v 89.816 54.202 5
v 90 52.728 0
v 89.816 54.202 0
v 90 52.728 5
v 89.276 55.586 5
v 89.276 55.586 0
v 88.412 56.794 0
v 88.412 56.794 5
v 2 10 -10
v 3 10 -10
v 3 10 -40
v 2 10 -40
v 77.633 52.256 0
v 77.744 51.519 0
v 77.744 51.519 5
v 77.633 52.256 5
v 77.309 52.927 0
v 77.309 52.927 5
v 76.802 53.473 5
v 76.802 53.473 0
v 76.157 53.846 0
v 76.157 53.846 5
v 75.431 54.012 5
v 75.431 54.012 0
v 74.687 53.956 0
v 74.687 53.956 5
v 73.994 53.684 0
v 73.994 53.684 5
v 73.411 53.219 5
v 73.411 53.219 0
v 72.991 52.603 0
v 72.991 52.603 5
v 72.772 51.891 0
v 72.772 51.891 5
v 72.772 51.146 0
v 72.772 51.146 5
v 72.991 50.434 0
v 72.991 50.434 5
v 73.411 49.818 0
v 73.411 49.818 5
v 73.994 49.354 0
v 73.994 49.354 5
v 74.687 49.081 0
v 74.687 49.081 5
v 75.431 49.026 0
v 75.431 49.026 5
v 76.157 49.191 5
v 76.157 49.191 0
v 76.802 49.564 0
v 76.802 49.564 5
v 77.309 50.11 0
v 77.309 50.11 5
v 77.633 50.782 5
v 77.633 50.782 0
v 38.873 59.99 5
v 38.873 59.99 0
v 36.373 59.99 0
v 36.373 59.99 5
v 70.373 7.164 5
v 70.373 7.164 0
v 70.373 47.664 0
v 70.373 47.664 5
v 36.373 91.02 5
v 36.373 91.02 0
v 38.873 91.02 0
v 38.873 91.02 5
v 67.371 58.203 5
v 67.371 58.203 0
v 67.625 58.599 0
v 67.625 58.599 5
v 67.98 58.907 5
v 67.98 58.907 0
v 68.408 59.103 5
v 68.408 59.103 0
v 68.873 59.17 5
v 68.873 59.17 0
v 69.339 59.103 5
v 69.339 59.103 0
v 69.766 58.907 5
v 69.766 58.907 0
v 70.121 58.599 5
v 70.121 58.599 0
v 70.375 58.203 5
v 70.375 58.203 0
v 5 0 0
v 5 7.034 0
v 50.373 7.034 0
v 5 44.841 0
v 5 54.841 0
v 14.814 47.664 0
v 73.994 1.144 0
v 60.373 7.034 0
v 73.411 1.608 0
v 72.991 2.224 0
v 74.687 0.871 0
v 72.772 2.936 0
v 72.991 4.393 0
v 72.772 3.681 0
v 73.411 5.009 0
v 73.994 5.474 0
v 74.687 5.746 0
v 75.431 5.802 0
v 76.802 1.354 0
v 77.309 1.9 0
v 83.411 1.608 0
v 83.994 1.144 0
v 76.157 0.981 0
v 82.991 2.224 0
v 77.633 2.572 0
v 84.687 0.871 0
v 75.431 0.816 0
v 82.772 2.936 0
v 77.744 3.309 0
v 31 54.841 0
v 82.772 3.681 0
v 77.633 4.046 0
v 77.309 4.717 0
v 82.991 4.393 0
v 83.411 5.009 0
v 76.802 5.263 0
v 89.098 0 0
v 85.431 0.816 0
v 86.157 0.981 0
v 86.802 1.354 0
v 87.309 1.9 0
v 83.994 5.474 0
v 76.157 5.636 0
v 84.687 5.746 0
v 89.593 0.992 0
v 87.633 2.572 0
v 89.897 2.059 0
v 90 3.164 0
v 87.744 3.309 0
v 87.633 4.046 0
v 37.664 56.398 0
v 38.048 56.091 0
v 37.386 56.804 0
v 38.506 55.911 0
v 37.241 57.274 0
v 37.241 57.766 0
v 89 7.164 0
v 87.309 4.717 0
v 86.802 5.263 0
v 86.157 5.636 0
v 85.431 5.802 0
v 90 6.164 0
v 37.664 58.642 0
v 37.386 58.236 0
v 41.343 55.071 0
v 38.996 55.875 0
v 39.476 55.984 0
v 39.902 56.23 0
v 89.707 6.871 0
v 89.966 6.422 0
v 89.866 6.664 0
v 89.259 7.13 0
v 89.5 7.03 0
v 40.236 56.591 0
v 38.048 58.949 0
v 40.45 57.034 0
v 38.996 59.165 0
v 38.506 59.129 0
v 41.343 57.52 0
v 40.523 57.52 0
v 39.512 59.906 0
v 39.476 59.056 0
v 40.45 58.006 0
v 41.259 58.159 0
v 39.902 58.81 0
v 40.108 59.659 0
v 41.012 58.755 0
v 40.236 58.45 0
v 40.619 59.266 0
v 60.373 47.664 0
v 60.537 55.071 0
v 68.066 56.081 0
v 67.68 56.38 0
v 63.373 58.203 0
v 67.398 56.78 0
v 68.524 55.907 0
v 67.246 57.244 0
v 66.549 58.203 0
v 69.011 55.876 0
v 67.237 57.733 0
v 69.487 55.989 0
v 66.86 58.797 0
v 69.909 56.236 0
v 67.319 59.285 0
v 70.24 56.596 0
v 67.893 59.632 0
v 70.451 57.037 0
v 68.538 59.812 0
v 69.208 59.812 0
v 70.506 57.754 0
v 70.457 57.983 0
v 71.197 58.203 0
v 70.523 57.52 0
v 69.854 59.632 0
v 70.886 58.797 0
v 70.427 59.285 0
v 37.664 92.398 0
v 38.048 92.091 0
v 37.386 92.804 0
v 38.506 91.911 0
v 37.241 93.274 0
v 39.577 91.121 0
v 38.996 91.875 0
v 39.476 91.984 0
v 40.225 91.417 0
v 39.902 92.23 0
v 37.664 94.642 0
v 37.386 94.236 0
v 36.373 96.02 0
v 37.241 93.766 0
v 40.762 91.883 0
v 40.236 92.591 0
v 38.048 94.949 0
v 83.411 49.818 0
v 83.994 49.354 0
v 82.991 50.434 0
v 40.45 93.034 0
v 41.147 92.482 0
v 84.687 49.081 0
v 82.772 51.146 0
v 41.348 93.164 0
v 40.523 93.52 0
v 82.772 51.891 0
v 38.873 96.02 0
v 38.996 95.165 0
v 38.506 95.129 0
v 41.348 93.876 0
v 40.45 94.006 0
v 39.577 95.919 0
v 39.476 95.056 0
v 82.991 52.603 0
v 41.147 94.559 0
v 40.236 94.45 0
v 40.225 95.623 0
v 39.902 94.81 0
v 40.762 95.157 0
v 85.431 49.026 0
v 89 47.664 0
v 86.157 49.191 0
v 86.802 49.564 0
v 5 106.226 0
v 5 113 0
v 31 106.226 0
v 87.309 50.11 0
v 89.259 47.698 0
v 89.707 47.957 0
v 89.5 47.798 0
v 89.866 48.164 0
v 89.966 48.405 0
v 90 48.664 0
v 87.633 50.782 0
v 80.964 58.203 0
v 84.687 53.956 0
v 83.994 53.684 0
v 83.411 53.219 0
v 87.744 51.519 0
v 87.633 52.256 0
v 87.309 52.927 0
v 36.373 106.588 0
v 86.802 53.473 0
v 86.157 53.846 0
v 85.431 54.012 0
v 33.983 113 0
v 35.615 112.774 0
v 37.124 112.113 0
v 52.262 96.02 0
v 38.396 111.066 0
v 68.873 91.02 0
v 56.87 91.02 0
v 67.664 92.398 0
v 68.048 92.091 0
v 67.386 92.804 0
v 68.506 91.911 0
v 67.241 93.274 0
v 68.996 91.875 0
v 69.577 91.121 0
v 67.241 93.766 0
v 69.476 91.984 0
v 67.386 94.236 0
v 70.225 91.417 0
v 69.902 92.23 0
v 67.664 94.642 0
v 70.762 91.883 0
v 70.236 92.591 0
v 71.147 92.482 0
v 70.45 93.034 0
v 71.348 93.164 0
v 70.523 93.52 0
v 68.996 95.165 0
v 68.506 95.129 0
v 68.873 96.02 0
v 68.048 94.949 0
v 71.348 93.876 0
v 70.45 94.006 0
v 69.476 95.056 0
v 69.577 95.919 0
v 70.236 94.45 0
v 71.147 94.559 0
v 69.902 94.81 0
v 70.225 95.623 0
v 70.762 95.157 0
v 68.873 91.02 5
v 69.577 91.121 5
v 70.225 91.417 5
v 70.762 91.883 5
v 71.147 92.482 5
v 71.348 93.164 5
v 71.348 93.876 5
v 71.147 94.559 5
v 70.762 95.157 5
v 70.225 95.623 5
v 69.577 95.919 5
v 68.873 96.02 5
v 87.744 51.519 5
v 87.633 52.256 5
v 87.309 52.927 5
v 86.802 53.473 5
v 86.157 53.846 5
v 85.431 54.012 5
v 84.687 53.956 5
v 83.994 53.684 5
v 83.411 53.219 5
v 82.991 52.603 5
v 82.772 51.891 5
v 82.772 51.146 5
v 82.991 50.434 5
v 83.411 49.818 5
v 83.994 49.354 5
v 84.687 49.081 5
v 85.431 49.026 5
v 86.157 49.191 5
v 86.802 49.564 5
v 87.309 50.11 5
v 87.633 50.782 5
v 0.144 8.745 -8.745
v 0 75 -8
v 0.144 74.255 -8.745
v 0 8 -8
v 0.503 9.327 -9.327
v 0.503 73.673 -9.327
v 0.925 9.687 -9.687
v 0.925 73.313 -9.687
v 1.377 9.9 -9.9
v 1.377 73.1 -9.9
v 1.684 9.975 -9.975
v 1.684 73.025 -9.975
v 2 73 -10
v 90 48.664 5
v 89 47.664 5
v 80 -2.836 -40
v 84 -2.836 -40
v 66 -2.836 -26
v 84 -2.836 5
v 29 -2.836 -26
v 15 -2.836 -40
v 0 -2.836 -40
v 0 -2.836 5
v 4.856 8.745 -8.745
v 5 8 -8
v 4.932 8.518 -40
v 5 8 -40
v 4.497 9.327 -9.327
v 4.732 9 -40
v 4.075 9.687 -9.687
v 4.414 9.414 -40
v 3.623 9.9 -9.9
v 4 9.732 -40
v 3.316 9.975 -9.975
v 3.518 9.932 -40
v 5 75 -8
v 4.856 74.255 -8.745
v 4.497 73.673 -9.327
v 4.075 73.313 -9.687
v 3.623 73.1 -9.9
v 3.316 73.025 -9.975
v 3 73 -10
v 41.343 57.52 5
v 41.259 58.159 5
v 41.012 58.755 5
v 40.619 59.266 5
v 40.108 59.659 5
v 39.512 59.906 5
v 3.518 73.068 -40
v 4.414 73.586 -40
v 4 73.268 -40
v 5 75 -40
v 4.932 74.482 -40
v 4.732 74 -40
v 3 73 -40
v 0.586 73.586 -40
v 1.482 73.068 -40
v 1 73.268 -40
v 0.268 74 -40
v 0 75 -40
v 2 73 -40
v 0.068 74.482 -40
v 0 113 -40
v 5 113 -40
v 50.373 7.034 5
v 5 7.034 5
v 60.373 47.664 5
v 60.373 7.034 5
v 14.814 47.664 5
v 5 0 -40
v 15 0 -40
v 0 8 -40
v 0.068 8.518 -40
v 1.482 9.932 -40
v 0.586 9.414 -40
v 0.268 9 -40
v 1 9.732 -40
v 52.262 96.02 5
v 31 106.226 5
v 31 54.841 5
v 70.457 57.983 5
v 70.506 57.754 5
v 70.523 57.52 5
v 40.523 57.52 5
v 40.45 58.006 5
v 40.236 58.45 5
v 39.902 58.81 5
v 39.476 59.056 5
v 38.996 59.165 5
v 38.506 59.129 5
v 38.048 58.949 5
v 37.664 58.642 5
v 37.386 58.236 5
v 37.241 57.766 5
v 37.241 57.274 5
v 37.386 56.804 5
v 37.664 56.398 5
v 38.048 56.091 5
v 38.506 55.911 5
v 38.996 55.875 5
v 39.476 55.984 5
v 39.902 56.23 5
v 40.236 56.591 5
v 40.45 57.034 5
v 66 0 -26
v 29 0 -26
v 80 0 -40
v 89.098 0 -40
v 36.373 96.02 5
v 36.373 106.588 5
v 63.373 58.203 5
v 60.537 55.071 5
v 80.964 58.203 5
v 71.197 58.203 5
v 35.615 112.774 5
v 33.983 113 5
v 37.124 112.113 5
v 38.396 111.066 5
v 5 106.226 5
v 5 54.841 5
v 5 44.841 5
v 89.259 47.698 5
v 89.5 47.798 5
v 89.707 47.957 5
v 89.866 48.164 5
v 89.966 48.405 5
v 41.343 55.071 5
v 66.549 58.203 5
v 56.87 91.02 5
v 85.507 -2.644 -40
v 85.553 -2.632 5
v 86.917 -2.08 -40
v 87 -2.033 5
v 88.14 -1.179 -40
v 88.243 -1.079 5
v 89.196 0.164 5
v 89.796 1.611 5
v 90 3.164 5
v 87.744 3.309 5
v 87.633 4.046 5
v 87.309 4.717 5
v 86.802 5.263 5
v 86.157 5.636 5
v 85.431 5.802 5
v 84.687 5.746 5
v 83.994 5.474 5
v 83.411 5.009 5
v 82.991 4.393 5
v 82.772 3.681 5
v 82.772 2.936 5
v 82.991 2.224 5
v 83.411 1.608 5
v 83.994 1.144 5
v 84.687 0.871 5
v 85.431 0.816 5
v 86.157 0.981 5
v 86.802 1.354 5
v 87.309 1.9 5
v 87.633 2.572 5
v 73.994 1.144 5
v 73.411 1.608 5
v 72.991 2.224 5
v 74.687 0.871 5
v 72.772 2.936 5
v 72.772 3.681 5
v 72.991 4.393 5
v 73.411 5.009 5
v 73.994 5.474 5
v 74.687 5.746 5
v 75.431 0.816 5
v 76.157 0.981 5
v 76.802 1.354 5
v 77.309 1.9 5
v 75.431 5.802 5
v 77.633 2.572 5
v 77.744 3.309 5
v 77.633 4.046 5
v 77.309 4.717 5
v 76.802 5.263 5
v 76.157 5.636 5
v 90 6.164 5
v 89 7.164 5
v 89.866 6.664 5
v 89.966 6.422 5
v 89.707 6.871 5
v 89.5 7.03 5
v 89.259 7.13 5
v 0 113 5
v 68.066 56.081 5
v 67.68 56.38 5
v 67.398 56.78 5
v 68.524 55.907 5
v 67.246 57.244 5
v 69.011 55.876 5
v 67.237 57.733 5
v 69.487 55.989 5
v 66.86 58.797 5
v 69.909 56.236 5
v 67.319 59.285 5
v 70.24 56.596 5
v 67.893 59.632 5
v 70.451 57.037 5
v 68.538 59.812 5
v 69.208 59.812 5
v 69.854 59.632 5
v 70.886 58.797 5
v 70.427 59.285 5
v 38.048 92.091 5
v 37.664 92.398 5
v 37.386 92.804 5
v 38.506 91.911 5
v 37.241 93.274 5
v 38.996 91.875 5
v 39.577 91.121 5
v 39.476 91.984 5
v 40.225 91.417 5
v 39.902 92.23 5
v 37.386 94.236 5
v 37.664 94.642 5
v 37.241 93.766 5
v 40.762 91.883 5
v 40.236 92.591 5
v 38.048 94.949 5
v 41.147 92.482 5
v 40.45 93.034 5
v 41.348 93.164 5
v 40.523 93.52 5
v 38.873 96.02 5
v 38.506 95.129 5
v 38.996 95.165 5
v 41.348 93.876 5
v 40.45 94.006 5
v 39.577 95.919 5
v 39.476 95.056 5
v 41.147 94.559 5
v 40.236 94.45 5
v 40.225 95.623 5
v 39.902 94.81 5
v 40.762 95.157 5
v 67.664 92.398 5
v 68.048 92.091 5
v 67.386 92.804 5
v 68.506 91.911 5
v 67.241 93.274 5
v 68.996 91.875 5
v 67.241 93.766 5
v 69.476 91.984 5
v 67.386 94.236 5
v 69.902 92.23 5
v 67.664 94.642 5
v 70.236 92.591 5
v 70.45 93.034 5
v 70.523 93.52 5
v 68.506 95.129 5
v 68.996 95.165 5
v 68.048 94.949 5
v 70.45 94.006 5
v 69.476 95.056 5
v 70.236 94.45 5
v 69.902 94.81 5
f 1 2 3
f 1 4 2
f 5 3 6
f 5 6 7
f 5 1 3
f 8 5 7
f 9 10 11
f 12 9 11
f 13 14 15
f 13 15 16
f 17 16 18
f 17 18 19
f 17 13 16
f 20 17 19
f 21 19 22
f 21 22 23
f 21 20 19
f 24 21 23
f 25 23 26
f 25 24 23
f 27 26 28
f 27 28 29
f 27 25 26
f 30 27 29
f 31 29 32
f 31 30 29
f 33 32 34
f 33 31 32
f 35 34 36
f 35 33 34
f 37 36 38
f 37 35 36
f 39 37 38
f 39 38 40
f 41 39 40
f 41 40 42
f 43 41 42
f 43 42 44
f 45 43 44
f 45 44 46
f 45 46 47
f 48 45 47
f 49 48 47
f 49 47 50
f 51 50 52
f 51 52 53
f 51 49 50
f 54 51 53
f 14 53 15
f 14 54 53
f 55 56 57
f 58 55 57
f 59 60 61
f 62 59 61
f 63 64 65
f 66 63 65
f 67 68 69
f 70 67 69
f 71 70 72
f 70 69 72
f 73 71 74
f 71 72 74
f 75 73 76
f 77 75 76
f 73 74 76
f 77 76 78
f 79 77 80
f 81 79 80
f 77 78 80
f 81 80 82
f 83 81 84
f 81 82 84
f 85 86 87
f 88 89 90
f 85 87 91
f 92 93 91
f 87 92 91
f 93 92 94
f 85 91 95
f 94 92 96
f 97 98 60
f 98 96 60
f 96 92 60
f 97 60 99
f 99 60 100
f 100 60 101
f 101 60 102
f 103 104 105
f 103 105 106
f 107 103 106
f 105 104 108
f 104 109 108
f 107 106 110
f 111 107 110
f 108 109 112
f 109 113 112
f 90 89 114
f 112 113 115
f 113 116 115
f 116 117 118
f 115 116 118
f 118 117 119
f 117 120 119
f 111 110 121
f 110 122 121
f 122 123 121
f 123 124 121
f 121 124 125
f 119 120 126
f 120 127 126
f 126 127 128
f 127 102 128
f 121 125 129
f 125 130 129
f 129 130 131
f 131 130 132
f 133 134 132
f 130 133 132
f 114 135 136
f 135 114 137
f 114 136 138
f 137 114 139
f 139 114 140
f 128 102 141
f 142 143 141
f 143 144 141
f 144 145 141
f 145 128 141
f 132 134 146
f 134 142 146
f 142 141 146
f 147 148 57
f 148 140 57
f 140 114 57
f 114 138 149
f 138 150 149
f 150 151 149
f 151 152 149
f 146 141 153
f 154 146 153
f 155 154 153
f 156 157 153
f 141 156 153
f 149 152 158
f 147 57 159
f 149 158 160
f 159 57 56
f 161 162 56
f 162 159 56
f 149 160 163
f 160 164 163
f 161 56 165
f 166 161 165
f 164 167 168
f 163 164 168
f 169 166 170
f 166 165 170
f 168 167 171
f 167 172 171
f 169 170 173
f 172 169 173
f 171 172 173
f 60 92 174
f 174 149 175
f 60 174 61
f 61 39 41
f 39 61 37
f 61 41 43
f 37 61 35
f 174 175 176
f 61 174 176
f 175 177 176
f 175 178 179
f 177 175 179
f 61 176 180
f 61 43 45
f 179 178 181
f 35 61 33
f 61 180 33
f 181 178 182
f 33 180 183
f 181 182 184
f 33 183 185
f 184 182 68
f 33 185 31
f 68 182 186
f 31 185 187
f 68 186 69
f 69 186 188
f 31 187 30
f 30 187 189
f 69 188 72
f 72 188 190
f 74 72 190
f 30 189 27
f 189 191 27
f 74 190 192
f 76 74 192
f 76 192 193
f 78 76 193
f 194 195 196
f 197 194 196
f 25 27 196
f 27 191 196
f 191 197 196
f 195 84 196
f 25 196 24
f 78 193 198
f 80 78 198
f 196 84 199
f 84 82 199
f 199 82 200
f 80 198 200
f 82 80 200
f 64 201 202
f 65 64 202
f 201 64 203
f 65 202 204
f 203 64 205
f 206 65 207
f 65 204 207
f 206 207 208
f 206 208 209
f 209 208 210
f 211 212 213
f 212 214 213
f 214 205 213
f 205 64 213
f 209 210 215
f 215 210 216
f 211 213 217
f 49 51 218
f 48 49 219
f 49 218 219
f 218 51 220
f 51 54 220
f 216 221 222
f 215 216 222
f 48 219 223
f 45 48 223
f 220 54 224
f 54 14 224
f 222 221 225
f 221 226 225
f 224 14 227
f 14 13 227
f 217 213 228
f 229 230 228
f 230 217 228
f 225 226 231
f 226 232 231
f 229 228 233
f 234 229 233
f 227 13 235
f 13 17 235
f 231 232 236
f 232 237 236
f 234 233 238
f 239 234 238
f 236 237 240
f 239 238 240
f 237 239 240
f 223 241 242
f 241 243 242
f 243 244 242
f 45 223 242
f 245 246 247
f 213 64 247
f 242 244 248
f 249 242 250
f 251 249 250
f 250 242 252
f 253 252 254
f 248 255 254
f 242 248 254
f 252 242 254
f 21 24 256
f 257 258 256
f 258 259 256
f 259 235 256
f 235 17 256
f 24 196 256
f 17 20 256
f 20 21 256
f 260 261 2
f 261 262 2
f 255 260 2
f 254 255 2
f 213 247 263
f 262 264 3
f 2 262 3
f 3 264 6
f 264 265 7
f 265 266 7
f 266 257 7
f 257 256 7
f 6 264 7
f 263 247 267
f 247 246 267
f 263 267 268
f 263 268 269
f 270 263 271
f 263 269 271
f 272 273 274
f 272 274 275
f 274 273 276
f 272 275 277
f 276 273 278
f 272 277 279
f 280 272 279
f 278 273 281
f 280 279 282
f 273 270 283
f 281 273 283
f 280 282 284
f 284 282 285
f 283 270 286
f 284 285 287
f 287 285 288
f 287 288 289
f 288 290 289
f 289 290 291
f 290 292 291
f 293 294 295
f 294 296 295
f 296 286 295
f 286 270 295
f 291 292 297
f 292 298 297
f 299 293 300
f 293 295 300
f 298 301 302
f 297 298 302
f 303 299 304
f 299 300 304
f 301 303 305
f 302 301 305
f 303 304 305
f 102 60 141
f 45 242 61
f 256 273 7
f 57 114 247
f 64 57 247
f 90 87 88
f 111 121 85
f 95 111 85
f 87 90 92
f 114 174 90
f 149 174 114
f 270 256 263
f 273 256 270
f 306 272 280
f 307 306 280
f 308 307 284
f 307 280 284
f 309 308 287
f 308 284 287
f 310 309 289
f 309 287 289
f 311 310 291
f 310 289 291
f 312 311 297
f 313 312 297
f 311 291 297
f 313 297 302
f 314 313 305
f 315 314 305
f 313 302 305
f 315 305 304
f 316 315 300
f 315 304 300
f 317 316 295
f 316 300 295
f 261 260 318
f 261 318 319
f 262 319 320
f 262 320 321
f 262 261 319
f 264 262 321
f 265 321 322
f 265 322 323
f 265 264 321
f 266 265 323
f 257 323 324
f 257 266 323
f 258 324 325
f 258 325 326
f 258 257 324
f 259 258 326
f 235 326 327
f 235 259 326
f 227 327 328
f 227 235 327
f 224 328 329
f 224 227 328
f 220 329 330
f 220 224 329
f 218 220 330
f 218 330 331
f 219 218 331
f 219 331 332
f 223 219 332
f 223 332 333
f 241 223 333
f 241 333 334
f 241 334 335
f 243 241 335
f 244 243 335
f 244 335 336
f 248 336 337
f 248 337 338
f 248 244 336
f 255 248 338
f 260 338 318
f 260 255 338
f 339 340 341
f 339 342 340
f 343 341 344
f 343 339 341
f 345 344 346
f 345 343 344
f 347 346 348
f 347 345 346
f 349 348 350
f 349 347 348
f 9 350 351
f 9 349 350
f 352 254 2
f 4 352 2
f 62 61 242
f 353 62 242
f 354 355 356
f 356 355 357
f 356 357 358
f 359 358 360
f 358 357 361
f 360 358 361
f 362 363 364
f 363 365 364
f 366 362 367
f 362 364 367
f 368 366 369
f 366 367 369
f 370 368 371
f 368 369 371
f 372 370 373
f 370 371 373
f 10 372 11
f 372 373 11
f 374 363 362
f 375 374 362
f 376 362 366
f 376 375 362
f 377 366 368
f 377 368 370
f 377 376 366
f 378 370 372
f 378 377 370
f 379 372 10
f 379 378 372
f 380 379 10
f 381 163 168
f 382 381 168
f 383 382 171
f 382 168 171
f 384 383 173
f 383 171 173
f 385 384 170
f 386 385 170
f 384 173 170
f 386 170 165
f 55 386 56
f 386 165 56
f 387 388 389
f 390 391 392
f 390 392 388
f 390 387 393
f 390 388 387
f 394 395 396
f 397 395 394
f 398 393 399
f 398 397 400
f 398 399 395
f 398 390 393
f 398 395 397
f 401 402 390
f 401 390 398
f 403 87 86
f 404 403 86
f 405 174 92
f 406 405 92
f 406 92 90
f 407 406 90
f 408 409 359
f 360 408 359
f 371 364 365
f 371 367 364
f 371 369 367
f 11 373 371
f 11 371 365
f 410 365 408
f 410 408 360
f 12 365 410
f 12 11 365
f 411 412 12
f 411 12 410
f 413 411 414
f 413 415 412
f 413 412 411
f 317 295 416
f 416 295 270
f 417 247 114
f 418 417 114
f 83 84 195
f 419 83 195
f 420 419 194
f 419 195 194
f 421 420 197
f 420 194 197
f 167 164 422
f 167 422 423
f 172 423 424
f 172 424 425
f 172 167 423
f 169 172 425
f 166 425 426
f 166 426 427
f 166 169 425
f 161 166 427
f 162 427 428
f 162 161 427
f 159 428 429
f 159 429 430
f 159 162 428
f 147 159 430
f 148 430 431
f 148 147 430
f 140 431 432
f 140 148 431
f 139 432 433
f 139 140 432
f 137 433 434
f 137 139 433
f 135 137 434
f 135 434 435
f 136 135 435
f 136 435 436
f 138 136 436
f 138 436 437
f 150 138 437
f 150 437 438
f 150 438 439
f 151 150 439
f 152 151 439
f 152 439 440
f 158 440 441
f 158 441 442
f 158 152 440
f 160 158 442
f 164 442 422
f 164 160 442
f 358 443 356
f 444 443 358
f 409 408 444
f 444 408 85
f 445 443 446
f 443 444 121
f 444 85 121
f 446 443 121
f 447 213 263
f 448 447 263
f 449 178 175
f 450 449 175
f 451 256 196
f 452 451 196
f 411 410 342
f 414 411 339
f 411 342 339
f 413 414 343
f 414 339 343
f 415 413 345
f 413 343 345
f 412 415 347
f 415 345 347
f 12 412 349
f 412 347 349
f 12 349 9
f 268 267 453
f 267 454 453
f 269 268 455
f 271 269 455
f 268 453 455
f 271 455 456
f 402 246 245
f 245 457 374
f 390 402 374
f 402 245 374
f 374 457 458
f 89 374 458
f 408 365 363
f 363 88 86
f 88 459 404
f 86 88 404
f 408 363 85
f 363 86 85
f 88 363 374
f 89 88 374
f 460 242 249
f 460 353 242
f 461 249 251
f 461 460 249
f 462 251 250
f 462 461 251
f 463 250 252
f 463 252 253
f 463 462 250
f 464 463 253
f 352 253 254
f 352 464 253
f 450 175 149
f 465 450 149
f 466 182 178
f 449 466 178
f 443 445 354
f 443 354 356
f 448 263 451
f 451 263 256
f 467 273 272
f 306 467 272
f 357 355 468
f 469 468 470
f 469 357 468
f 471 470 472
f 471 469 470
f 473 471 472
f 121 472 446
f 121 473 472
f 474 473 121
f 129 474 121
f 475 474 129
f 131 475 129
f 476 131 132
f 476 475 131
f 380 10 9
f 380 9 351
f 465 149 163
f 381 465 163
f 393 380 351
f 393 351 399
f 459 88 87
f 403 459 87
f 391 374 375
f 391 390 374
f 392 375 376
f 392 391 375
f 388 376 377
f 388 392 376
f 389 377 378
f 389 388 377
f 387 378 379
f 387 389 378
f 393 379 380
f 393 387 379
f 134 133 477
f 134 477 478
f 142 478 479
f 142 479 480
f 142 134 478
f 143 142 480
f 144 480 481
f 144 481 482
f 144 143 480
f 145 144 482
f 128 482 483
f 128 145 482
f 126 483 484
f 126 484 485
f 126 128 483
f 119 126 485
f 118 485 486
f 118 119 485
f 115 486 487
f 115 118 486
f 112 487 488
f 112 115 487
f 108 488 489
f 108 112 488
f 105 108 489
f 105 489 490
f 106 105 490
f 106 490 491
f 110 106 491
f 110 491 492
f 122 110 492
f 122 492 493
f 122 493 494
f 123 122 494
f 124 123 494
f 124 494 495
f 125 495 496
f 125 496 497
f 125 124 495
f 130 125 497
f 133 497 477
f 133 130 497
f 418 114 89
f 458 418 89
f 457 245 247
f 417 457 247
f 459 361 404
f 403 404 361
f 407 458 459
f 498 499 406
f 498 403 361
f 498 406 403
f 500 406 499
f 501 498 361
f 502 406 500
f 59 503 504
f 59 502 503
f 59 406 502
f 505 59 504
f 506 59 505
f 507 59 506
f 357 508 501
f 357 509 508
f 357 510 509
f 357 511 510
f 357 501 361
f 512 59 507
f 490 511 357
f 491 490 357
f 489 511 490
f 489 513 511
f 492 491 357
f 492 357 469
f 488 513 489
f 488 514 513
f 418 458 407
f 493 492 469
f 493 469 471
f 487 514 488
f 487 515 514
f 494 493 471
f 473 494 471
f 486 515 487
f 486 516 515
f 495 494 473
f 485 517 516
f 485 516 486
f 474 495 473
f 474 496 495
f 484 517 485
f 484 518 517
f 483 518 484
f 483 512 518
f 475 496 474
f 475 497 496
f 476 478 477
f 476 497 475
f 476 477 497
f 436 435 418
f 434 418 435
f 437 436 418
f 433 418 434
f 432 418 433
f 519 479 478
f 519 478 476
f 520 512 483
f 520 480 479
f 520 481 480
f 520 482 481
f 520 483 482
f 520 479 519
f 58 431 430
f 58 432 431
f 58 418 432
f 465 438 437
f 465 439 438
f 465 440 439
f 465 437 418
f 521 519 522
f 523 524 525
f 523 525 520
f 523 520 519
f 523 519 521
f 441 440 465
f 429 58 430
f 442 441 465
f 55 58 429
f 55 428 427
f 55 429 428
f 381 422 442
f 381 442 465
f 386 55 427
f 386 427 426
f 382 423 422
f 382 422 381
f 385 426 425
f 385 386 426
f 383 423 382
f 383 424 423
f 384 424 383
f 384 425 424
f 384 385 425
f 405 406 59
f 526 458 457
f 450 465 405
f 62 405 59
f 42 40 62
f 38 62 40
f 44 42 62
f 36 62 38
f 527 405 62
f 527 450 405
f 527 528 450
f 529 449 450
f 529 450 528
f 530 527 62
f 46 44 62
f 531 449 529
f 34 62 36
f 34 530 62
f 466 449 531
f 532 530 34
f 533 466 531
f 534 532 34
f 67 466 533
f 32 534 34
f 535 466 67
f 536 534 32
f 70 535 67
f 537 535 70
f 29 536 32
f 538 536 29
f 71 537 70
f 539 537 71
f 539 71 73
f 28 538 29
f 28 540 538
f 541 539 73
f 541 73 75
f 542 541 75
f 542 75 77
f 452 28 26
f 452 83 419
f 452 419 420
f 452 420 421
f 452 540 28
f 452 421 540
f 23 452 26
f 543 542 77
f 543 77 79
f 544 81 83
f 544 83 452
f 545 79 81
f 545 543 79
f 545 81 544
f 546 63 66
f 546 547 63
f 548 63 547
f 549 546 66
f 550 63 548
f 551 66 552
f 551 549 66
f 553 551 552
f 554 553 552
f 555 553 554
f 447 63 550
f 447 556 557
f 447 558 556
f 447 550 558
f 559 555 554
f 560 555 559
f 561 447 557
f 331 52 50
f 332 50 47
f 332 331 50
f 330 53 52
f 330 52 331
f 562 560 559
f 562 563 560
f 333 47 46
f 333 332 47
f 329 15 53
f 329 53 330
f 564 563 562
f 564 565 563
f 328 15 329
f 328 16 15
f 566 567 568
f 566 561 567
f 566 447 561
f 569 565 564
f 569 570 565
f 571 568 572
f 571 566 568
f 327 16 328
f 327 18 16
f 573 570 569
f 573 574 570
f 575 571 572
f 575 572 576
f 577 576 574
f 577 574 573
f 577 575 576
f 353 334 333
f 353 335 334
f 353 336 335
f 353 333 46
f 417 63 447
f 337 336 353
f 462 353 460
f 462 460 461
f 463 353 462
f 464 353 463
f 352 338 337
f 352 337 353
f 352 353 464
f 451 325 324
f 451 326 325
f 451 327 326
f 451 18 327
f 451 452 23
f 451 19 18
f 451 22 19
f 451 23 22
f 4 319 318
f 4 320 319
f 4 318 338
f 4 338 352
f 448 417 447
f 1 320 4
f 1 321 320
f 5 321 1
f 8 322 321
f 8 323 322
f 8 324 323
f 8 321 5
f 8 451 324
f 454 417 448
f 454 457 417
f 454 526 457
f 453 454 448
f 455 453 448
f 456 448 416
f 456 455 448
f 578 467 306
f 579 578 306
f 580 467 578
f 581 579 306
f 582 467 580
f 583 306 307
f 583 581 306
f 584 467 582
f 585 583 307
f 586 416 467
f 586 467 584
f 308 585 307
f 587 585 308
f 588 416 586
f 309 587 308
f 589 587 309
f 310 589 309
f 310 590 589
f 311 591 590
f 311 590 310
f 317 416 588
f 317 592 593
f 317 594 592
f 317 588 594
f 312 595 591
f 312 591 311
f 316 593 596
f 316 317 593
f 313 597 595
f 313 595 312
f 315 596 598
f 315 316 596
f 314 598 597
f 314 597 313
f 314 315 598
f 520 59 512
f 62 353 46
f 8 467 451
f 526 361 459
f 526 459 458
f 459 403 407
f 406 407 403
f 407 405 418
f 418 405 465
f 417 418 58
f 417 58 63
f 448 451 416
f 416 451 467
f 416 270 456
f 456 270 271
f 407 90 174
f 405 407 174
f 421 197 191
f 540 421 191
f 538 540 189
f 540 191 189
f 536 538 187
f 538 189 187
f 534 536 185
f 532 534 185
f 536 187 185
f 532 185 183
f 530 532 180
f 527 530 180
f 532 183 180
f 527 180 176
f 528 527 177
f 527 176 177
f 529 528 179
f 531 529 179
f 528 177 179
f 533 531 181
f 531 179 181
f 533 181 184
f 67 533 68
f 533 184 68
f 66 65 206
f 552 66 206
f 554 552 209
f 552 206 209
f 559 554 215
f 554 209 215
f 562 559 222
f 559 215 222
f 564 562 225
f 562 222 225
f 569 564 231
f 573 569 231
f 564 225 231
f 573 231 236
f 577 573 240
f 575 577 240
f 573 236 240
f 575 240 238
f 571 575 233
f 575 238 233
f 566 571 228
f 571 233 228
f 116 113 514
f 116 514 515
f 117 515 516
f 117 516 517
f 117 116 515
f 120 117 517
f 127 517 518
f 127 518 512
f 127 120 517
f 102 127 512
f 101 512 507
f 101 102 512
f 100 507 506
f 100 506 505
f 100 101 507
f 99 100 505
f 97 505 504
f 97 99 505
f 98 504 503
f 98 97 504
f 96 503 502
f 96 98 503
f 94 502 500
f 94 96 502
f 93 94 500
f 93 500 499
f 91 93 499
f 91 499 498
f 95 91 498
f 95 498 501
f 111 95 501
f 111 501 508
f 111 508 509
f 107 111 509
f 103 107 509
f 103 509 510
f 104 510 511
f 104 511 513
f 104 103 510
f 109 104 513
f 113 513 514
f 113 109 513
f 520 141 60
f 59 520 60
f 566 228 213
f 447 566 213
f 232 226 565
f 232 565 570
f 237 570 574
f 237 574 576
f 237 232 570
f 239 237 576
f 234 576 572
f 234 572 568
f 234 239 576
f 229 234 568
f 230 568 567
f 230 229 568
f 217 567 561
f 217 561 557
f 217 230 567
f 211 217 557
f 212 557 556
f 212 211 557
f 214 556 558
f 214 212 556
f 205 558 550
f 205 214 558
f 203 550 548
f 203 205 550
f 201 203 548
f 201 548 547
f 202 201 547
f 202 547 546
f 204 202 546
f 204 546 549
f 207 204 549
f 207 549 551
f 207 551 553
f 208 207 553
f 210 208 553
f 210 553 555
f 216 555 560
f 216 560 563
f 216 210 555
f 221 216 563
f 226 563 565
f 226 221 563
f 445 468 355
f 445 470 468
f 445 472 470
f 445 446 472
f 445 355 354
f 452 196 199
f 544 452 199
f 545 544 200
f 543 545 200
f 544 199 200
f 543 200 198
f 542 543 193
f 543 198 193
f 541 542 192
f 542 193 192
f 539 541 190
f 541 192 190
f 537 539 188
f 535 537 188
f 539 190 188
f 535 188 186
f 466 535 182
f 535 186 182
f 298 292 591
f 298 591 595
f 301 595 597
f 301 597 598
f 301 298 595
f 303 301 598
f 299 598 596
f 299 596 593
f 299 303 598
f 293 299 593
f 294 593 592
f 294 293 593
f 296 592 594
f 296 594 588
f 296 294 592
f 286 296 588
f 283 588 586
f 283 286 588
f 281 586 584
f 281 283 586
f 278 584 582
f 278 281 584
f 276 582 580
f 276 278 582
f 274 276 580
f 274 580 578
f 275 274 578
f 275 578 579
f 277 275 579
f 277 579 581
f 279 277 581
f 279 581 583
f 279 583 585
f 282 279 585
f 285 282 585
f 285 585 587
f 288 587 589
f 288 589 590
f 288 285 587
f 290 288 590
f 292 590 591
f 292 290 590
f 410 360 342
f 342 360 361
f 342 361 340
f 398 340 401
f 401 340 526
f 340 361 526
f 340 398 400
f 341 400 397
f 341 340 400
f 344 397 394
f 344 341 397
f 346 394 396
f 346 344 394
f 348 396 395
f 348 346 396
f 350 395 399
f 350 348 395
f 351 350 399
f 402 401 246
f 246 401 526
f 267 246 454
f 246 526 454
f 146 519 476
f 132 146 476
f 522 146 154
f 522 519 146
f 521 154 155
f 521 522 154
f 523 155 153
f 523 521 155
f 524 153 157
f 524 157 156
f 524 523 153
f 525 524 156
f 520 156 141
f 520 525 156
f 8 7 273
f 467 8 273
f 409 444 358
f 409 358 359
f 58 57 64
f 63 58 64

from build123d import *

# Parameters (mm, degrees)
SKETCH_2_R          = 2.5
SKETCH_2_R_2        = 1.65
EXTRUDE_1_DEPTH     = 5
SKETCH_3_W          = 5
SKETCH_3_H          = 7.033503338
EXTRUDE_2_DEPTH     = 40
CUT_EXTRUDE_1_REACH = 7
SKETCH_6_W          = 30
SKETCH_6_H          = 63
CUT_EXTRUDE_2_DEPTH = 10
FILLET_1_R          = 6
FILLET_2_R          = 2
FILLET_3_R          = 1


with BuildPart() as part:
    # 草图2 → 凸台-拉伸1 (new body)
    with BuildSketch(Plane.XY):
        with BuildLine():
            Line((90, -2.836370327), (90, -0.033503338))
            Line((90, -0.033503338), (90, 7.163629673))
            Line((90, 7.163629673), (70.37335416, 7.163629673))
            Line((70.37335416, 7.163629673), (70.37335416, 47.663629673))
            Line((70.37335416, 47.663629673), (90, 47.663629673))
            Line((90, 47.663629673), (90, 55.071074042))
            Line((90, 55.071074042), (56.86982625, 91.020052584))
            Line((56.86982625, 91.020052584), (68.87304018, 91.020052584))
            ThreePointArc((68.87304018, 91.020052584), (71.37304018, 93.520052584), (68.87304018, 96.020052584))
            Line((68.87304018, 96.020052584), (52.261882562, 96.020052584))
            Line((52.261882562, 96.020052584), (36.613354259, 113))
            Line((36.613354259, 113), (0, 113))
            Line((0, 113), (0, 0))
            Line((0, 0), (0, -2.836370327))
            Line((0, -2.836370327), (90, -2.836370327))
        make_face()
        Polygon((5, 7.033503338), (5, 44.840982038), (50.37304018, 7.033503338), (10, 7.033503338), align=None, mode=Mode.SUBTRACT)
        Polygon((60.37304018, 7.033503338), (14.814475837, 47.663629673), (60.37304018, 47.663629673), align=None, mode=Mode.SUBTRACT)
        with Locations((75.24372976, 3.308629673)):
            Circle(SKETCH_2_R, mode=Mode.SUBTRACT)
        with Locations((85.24372976, 3.308629673)):
            Circle(SKETCH_2_R, mode=Mode.SUBTRACT)
        with Locations((75.24372976, 51.518629673)):
            Circle(SKETCH_2_R, mode=Mode.SUBTRACT)
        with Locations((85.24372976, 51.518629673)):
            Circle(SKETCH_2_R, mode=Mode.SUBTRACT)
        Polygon((5, 106.225949783), (31, 106.225949783), (31, 54.840982038), (11.37304018, 54.840982038), (6.37304018, 54.840982038), (5, 54.840982038), (5, 91.020052584), (5, 96.020052584), align=None, mode=Mode.SUBTRACT)
        with Locations((38.87304018, 57.520052584)):
            Circle(SKETCH_2_R_2, mode=Mode.SUBTRACT)
        with Locations((38.87304018, 93.520052584)):
            Circle(SKETCH_2_R_2, mode=Mode.SUBTRACT)
        with BuildLine():
            Line((36.37304018, 106.587975229), (80.964081518, 58.203007486))
            Line((80.964081518, 58.203007486), (71.196585176, 58.203007486))
            ThreePointArc((71.196585176, 58.203007486), (68.87304018, 59.834918346), (66.549495185, 58.203007486))
            Line((66.549495185, 58.203007486), (63.373040182, 58.203007486))
            Line((63.373040182, 58.203007486), (60.53695685, 55.071074042))
            Line((60.53695685, 55.071074042), (41.37304018, 55.071074042))
            Line((41.37304018, 55.071074042), (41.342732423, 55.071074042))
            Line((41.342732423, 55.071074042), (41.342732423, 57.520052584))
            ThreePointArc((41.342732423, 57.520052584), (40.619376312, 59.266388716), (38.87304018, 59.989744826))
            Line((38.87304018, 59.989744826), (36.37304018, 59.989744826))
            Line((36.37304018, 59.989744826), (36.37304018, 91.020052584))
            Line((36.37304018, 91.020052584), (38.87304018, 91.020052584))
            ThreePointArc((38.87304018, 91.020052584), (41.37304018, 93.520052584), (38.87304018, 96.020052584))
            Line((38.87304018, 96.020052584), (36.37304018, 96.020052584))
            Line((36.37304018, 96.020052584), (36.37304018, 106.587975229))
        make_face(mode=Mode.SUBTRACT)
        with BuildLine():
            ThreePointArc((67.371017344, 58.203007486), (68.87304018, 59.170052584), (70.375063017, 58.203007486))
            ThreePointArc((70.375063017, 58.203007486), (70.485621602, 57.869453729), (70.52304018, 57.520052584))
            ThreePointArc((70.52304018, 57.520052584), (68.523639036, 55.907471163), (67.371017344, 58.203007486))
        make_face(mode=Mode.SUBTRACT)
        with Locations((68.87304018, 93.520052584)):
            Circle(SKETCH_2_R_2, mode=Mode.SUBTRACT)
    extrude(amount=EXTRUDE_1_DEPTH)

    # 草图3 → 凸台-拉伸2 (add)
    with BuildSketch(Plane(origin=(0, 0, 0), x_dir=(-1, 0, 0), z_dir=(0, 0, -1))):
        Polygon((0, -2.836370327), (0, 0), (-5, 0), (-90, 0), (-90, -2.836370327), align=None)
        with Locations((-2.5, 3.516751669)):
            Rectangle(SKETCH_3_W, SKETCH_3_H)
        Polygon((-5, 7.033503338), (0, 7.033503338), (0, 113), (-5, 113), (-5, 106.225949783), (-5, 54.840982038), (-5, 44.840982038), align=None)
    extrude(amount=EXTRUDE_2_DEPTH)

    # 草图6 → 切除-拉伸1 (cut, up to next)
    with BuildSketch(Plane(origin=(5, 0, 0), x_dir=(0, 0, -1), z_dir=(1, 0, 0)), mode=Mode.PRIVATE) as cut_extrude_1_sk1:
        with Locations((25, 41.5)):
            Rectangle(SKETCH_6_W, SKETCH_6_H)
    cut_extrude_1_tool1 = extrude(cut_extrude_1_sk1.sketch, amount=-CUT_EXTRUDE_1_REACH, mode=Mode.PRIVATE) & part.part
    add(cut_extrude_1_tool1.solids().sort_by_distance((5, 41.5, -25))[0], mode=Mode.SUBTRACT)

    # 草图7 → 切除-拉伸2 (cut)
    with BuildSketch(Plane(origin=(0, 0, 0), x_dir=(1, 0, 0), z_dir=(0, 1, 0))):
        Polygon((80, 40), (66, 26), (29, 26), (15, 40), align=None)
    extrude(amount=-CUT_EXTRUDE_2_DEPTH, mode=Mode.SUBTRACT)

    # 圆角1
    fillet_1_edges = [part.edges().sort_by_distance(p)[0] for p in [
        (90, -2.836370327, -17.5),
        (90, 55.071074042, 2.5),
        (36.613354259, 113, 2.5),
    ]]
    fillet(fillet_1_edges, radius=FILLET_1_R)

    # 圆角2
    fillet_2_edges = [part.edges().sort_by_distance(p)[0] for p in [
        (0, 73, -25),
        (0, 10, -25),
        (0, 41.5, -10),
        (5, 73, -25),
        (5, 41.5, -10),
        (5, 10, -25),
    ]]
    fillet(fillet_2_edges, radius=FILLET_2_R)

    # 圆角3
    fillet_3_edges = [part.edges().sort_by_distance(p)[0] for p in [
        (90, 47.663629673, 2.5),
        (90, 7.163629673, 2.5),
    ]]
    fillet(fillet_3_edges, radius=FILLET_3_R)


solid = part.part
